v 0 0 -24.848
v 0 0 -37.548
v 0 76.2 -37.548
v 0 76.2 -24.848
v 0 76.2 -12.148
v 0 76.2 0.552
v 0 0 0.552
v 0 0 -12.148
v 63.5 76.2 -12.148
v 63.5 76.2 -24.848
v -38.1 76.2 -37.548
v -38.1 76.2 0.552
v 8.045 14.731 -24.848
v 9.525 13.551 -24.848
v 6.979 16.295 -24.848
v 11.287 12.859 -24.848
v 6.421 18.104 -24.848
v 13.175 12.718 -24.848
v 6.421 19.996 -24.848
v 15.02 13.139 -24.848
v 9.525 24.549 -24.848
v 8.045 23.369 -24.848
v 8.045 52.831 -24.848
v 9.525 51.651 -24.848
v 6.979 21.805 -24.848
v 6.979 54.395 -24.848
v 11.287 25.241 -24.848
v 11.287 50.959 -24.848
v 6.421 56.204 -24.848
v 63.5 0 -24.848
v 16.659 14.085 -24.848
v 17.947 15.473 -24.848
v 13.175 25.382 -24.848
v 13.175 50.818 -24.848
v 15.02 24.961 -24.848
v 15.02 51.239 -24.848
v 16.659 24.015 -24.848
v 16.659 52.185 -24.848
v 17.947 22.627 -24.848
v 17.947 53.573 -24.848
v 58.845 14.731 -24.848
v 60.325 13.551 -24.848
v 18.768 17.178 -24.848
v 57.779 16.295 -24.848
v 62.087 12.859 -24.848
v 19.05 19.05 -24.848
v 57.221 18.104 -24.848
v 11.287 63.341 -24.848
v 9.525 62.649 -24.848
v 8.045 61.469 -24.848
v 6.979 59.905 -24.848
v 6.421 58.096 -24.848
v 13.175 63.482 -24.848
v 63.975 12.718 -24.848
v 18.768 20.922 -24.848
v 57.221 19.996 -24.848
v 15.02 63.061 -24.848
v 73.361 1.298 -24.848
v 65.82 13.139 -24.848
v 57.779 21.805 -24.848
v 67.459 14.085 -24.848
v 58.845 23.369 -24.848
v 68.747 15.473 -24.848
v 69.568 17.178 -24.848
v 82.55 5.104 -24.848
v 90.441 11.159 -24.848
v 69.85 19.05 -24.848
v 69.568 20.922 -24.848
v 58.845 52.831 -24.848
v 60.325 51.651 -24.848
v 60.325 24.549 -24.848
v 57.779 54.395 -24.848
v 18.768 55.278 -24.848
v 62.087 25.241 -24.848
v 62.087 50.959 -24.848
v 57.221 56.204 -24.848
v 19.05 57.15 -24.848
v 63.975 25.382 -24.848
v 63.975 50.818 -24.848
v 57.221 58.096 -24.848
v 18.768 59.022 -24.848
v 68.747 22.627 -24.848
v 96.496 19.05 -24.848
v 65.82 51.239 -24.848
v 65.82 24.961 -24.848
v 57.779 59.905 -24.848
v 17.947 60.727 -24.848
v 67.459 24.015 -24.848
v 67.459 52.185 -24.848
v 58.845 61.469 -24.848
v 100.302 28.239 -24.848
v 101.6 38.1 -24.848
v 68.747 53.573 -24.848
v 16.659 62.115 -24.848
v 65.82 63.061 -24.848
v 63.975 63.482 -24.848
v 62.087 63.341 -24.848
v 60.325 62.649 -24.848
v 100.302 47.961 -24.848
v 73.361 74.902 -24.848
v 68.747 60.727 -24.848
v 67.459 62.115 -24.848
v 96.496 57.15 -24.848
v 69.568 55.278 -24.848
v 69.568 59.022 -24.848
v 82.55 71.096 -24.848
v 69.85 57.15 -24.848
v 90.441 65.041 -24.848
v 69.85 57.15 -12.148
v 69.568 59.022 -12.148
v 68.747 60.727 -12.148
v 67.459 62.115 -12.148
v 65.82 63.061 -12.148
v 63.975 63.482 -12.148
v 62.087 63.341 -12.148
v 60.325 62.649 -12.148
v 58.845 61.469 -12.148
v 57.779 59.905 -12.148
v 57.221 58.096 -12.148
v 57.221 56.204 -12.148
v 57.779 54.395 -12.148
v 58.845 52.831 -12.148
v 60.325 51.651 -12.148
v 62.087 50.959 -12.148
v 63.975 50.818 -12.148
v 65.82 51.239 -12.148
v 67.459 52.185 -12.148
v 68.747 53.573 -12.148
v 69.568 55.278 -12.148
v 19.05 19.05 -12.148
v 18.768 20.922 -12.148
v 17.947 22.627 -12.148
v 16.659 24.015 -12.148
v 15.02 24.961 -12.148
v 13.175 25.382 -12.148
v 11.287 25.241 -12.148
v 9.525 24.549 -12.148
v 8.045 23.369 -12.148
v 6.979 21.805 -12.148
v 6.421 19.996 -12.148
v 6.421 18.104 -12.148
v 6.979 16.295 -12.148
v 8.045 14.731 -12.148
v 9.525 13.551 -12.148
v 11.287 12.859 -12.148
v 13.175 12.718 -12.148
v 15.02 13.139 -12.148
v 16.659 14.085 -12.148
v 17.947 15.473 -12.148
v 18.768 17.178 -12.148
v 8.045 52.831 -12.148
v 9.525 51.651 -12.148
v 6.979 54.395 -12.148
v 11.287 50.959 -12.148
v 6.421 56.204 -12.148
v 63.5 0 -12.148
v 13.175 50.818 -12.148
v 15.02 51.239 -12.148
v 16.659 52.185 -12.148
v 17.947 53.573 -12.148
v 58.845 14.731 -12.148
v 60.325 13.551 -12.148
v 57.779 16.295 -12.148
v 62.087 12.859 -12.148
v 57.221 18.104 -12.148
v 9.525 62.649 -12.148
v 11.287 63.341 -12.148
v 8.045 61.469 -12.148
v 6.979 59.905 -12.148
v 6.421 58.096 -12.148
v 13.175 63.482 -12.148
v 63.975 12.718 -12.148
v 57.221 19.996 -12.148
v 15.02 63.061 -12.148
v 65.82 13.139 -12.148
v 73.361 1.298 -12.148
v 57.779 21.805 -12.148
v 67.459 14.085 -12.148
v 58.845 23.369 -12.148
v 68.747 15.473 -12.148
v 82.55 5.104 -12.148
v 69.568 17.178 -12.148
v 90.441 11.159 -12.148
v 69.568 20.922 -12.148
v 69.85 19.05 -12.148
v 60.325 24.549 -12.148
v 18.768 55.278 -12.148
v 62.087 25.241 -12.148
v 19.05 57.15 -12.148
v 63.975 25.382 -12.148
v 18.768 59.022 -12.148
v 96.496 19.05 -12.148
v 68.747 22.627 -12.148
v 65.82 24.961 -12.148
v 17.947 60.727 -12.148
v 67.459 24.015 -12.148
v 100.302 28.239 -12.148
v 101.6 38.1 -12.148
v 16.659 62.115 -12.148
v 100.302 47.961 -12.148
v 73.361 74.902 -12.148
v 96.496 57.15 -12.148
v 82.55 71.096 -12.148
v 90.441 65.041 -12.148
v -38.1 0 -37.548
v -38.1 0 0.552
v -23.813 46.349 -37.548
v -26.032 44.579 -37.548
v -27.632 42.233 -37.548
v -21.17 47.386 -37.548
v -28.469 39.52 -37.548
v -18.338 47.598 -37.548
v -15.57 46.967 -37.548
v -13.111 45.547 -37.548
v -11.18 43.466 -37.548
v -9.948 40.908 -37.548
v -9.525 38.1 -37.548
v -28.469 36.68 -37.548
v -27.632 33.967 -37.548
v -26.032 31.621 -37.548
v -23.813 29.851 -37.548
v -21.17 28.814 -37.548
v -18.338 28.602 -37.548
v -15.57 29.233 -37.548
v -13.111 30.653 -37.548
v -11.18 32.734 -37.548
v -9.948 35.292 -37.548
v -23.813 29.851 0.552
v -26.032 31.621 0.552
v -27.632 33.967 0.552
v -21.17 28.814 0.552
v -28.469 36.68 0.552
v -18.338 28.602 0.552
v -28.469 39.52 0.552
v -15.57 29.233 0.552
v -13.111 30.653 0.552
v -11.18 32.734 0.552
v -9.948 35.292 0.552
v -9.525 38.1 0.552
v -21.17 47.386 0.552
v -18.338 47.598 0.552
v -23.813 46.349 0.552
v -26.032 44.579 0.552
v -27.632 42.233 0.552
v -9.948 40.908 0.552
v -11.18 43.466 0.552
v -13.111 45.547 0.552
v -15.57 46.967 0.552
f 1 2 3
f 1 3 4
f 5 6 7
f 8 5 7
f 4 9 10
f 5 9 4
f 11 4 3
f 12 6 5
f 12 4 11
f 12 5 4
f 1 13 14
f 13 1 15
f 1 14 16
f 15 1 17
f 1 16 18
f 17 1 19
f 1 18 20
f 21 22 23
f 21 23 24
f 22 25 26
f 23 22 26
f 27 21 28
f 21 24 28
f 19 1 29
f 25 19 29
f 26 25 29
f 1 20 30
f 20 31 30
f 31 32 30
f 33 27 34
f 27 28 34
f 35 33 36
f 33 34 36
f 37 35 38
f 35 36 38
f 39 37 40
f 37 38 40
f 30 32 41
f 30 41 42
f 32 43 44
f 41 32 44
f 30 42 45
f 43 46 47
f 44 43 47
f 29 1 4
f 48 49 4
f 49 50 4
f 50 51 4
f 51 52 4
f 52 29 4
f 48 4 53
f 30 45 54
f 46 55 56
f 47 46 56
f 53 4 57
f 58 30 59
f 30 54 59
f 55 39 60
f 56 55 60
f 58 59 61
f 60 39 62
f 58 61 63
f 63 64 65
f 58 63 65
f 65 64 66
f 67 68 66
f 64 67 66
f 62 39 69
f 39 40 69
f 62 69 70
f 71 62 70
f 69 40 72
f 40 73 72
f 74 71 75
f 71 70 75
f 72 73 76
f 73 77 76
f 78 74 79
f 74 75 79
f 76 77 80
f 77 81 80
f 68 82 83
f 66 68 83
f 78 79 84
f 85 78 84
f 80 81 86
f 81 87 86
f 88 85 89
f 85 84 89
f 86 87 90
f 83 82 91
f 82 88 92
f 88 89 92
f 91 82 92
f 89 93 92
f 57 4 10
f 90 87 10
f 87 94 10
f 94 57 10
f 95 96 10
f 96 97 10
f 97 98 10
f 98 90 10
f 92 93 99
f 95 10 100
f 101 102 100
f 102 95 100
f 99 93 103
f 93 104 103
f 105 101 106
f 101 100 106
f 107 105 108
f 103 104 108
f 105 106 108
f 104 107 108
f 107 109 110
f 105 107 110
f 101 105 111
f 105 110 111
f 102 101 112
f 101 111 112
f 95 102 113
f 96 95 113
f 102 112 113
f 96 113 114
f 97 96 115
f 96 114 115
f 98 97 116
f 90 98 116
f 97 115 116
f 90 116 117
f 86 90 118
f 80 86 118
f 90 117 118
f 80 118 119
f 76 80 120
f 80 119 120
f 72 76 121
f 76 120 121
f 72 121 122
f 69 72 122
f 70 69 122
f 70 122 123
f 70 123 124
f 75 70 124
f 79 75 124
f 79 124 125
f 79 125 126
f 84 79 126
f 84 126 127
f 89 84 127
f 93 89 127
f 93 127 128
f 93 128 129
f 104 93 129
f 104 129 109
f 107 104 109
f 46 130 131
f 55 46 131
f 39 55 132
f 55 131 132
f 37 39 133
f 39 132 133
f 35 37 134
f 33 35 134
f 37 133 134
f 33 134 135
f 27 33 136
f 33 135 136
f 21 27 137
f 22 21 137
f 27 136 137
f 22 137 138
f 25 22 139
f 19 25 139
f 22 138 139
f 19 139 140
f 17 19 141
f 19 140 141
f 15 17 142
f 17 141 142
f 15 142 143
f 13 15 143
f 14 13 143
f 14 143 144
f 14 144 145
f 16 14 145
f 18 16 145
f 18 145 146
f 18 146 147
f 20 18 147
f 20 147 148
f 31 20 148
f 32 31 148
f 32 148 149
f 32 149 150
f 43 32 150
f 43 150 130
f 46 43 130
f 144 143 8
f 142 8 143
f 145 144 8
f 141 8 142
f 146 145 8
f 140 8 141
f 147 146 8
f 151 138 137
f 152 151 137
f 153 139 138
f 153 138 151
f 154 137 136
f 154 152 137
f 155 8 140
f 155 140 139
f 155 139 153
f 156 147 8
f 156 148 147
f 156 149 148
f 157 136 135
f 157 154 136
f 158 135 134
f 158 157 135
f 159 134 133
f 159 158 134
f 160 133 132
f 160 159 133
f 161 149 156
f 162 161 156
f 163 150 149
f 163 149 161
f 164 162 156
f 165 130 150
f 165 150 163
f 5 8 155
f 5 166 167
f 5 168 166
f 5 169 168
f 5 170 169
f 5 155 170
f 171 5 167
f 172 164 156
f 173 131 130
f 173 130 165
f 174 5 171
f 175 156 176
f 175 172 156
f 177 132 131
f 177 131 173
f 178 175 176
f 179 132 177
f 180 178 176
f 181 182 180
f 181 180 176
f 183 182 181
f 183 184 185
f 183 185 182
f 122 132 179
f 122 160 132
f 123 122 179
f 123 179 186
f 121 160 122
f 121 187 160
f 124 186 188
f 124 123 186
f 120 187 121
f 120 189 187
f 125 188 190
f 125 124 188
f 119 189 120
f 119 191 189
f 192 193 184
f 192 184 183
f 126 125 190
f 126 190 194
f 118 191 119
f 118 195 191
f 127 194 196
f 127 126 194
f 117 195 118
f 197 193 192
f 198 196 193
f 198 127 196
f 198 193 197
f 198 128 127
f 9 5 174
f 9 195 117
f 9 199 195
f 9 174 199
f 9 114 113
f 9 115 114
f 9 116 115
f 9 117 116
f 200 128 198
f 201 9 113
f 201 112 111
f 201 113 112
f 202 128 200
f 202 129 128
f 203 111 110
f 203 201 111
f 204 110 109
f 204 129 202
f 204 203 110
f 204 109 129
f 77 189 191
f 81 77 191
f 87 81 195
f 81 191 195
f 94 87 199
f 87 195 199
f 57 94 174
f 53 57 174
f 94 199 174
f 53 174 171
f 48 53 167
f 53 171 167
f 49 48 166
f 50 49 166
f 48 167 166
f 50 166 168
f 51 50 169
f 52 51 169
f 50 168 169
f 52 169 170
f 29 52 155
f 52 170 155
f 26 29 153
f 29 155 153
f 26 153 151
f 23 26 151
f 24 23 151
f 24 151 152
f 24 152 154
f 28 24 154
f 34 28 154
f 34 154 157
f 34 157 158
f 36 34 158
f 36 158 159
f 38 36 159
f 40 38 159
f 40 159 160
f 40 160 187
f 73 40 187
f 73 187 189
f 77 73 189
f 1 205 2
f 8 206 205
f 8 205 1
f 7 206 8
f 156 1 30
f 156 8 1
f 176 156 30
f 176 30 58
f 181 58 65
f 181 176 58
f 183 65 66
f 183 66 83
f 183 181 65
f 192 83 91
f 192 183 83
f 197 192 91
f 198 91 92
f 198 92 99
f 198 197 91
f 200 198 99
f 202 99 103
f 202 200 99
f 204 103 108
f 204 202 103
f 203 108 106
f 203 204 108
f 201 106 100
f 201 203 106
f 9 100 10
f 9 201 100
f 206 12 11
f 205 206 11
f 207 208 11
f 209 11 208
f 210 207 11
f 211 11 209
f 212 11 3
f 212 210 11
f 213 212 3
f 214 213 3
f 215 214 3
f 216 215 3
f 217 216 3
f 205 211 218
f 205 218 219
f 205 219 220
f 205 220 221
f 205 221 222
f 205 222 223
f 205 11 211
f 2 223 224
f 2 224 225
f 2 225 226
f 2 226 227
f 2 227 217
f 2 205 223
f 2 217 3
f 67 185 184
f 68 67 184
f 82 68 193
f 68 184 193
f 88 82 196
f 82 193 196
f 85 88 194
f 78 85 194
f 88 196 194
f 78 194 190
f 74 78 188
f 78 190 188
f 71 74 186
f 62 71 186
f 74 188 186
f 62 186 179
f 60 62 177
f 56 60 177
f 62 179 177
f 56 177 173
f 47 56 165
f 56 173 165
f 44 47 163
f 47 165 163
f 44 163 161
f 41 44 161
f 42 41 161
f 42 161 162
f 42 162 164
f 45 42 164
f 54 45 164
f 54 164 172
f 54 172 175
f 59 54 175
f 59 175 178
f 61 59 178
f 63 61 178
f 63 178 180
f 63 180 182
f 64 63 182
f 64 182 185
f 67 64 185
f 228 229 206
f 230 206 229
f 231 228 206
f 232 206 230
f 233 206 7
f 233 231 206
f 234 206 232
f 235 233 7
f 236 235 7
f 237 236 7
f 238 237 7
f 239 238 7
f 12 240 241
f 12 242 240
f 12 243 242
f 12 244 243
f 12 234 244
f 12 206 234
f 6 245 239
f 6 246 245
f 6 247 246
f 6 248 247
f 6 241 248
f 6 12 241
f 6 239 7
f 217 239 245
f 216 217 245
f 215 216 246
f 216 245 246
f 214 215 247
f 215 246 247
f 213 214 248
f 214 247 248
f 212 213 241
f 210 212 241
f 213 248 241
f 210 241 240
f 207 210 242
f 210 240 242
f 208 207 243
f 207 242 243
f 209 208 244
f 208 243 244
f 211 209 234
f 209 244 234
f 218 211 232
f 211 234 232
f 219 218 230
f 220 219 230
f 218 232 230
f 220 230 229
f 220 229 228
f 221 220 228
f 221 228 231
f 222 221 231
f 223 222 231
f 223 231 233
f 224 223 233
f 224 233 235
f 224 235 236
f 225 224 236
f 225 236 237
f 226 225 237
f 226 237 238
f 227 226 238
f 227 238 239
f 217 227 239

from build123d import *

# Parameters (mm, degrees)
F1_DEPTH = 76.2
F2_R     = 9.525
F3_DEPTH = 38.101
F4_R     = 6.35
F5_DEPTH = 25.4
F6_DEPTH = 12.7


with BuildPart() as f1:
    # F0 (on Front) → F1 (new body)
    with BuildSketch(Plane.XZ):
        Polygon((0, 0.552274), (-38.1, 0.552274), (-38.1, -37.547726), (0, -37.547726), (0, -3.861072), align=None)
    extrude(amount=-F1_DEPTH)

    # F2 (on face) → F3 (cut, through all)
    with BuildSketch(Plane.XY.offset(0.552274)):
        with Locations((-19.05, 38.1)):
            Circle(F2_R)
    extrude(amount=-F3_DEPTH, mode=Mode.SUBTRACT)

    # F4 (on face) → F5 (join)
    with BuildSketch(Plane.XY.offset(0.552274)):
        with BuildLine():
            Line((0, 76.2), (0, 0))
            Line((0, 0), (63.5, 0))
            ThreePointArc((63.5, 0), (101.6, 38.1), (63.5, 76.2))
            Line((63.5, 76.2), (0, 76.2))
        make_face()
        with Locations((12.7, 19.05)):
            Circle(F4_R, mode=Mode.SUBTRACT)
        with Locations((63.5, 19.05)):
            Circle(F4_R, mode=Mode.SUBTRACT)
        with Locations((12.7, 57.15)):
            Circle(F4_R, mode=Mode.SUBTRACT)
        with Locations((63.5, 57.15)):
            Circle(F4_R, mode=Mode.SUBTRACT)
    extrude(amount=-F5_DEPTH)

    # F4 (on face) → F6 (cut)
    with BuildSketch(Plane.XY.offset(0.552274)):
        with BuildLine():
            Line((0, 76.2), (0, 0))
            Line((0, 0), (63.5, 0))
            ThreePointArc((63.5, 0), (101.6, 38.1), (63.5, 76.2))
            Line((63.5, 76.2), (0, 76.2))
        make_face()
        with Locations((12.7, 19.05)):
            Circle(F4_R, mode=Mode.SUBTRACT)
        with Locations((63.5, 19.05)):
            Circle(F4_R, mode=Mode.SUBTRACT)
        with Locations((12.7, 57.15)):
            Circle(F4_R, mode=Mode.SUBTRACT)
        with Locations((63.5, 57.15)):
            Circle(F4_R, mode=Mode.SUBTRACT)
    extrude(amount=-F6_DEPTH, mode=Mode.SUBTRACT)


solid = f1.part
